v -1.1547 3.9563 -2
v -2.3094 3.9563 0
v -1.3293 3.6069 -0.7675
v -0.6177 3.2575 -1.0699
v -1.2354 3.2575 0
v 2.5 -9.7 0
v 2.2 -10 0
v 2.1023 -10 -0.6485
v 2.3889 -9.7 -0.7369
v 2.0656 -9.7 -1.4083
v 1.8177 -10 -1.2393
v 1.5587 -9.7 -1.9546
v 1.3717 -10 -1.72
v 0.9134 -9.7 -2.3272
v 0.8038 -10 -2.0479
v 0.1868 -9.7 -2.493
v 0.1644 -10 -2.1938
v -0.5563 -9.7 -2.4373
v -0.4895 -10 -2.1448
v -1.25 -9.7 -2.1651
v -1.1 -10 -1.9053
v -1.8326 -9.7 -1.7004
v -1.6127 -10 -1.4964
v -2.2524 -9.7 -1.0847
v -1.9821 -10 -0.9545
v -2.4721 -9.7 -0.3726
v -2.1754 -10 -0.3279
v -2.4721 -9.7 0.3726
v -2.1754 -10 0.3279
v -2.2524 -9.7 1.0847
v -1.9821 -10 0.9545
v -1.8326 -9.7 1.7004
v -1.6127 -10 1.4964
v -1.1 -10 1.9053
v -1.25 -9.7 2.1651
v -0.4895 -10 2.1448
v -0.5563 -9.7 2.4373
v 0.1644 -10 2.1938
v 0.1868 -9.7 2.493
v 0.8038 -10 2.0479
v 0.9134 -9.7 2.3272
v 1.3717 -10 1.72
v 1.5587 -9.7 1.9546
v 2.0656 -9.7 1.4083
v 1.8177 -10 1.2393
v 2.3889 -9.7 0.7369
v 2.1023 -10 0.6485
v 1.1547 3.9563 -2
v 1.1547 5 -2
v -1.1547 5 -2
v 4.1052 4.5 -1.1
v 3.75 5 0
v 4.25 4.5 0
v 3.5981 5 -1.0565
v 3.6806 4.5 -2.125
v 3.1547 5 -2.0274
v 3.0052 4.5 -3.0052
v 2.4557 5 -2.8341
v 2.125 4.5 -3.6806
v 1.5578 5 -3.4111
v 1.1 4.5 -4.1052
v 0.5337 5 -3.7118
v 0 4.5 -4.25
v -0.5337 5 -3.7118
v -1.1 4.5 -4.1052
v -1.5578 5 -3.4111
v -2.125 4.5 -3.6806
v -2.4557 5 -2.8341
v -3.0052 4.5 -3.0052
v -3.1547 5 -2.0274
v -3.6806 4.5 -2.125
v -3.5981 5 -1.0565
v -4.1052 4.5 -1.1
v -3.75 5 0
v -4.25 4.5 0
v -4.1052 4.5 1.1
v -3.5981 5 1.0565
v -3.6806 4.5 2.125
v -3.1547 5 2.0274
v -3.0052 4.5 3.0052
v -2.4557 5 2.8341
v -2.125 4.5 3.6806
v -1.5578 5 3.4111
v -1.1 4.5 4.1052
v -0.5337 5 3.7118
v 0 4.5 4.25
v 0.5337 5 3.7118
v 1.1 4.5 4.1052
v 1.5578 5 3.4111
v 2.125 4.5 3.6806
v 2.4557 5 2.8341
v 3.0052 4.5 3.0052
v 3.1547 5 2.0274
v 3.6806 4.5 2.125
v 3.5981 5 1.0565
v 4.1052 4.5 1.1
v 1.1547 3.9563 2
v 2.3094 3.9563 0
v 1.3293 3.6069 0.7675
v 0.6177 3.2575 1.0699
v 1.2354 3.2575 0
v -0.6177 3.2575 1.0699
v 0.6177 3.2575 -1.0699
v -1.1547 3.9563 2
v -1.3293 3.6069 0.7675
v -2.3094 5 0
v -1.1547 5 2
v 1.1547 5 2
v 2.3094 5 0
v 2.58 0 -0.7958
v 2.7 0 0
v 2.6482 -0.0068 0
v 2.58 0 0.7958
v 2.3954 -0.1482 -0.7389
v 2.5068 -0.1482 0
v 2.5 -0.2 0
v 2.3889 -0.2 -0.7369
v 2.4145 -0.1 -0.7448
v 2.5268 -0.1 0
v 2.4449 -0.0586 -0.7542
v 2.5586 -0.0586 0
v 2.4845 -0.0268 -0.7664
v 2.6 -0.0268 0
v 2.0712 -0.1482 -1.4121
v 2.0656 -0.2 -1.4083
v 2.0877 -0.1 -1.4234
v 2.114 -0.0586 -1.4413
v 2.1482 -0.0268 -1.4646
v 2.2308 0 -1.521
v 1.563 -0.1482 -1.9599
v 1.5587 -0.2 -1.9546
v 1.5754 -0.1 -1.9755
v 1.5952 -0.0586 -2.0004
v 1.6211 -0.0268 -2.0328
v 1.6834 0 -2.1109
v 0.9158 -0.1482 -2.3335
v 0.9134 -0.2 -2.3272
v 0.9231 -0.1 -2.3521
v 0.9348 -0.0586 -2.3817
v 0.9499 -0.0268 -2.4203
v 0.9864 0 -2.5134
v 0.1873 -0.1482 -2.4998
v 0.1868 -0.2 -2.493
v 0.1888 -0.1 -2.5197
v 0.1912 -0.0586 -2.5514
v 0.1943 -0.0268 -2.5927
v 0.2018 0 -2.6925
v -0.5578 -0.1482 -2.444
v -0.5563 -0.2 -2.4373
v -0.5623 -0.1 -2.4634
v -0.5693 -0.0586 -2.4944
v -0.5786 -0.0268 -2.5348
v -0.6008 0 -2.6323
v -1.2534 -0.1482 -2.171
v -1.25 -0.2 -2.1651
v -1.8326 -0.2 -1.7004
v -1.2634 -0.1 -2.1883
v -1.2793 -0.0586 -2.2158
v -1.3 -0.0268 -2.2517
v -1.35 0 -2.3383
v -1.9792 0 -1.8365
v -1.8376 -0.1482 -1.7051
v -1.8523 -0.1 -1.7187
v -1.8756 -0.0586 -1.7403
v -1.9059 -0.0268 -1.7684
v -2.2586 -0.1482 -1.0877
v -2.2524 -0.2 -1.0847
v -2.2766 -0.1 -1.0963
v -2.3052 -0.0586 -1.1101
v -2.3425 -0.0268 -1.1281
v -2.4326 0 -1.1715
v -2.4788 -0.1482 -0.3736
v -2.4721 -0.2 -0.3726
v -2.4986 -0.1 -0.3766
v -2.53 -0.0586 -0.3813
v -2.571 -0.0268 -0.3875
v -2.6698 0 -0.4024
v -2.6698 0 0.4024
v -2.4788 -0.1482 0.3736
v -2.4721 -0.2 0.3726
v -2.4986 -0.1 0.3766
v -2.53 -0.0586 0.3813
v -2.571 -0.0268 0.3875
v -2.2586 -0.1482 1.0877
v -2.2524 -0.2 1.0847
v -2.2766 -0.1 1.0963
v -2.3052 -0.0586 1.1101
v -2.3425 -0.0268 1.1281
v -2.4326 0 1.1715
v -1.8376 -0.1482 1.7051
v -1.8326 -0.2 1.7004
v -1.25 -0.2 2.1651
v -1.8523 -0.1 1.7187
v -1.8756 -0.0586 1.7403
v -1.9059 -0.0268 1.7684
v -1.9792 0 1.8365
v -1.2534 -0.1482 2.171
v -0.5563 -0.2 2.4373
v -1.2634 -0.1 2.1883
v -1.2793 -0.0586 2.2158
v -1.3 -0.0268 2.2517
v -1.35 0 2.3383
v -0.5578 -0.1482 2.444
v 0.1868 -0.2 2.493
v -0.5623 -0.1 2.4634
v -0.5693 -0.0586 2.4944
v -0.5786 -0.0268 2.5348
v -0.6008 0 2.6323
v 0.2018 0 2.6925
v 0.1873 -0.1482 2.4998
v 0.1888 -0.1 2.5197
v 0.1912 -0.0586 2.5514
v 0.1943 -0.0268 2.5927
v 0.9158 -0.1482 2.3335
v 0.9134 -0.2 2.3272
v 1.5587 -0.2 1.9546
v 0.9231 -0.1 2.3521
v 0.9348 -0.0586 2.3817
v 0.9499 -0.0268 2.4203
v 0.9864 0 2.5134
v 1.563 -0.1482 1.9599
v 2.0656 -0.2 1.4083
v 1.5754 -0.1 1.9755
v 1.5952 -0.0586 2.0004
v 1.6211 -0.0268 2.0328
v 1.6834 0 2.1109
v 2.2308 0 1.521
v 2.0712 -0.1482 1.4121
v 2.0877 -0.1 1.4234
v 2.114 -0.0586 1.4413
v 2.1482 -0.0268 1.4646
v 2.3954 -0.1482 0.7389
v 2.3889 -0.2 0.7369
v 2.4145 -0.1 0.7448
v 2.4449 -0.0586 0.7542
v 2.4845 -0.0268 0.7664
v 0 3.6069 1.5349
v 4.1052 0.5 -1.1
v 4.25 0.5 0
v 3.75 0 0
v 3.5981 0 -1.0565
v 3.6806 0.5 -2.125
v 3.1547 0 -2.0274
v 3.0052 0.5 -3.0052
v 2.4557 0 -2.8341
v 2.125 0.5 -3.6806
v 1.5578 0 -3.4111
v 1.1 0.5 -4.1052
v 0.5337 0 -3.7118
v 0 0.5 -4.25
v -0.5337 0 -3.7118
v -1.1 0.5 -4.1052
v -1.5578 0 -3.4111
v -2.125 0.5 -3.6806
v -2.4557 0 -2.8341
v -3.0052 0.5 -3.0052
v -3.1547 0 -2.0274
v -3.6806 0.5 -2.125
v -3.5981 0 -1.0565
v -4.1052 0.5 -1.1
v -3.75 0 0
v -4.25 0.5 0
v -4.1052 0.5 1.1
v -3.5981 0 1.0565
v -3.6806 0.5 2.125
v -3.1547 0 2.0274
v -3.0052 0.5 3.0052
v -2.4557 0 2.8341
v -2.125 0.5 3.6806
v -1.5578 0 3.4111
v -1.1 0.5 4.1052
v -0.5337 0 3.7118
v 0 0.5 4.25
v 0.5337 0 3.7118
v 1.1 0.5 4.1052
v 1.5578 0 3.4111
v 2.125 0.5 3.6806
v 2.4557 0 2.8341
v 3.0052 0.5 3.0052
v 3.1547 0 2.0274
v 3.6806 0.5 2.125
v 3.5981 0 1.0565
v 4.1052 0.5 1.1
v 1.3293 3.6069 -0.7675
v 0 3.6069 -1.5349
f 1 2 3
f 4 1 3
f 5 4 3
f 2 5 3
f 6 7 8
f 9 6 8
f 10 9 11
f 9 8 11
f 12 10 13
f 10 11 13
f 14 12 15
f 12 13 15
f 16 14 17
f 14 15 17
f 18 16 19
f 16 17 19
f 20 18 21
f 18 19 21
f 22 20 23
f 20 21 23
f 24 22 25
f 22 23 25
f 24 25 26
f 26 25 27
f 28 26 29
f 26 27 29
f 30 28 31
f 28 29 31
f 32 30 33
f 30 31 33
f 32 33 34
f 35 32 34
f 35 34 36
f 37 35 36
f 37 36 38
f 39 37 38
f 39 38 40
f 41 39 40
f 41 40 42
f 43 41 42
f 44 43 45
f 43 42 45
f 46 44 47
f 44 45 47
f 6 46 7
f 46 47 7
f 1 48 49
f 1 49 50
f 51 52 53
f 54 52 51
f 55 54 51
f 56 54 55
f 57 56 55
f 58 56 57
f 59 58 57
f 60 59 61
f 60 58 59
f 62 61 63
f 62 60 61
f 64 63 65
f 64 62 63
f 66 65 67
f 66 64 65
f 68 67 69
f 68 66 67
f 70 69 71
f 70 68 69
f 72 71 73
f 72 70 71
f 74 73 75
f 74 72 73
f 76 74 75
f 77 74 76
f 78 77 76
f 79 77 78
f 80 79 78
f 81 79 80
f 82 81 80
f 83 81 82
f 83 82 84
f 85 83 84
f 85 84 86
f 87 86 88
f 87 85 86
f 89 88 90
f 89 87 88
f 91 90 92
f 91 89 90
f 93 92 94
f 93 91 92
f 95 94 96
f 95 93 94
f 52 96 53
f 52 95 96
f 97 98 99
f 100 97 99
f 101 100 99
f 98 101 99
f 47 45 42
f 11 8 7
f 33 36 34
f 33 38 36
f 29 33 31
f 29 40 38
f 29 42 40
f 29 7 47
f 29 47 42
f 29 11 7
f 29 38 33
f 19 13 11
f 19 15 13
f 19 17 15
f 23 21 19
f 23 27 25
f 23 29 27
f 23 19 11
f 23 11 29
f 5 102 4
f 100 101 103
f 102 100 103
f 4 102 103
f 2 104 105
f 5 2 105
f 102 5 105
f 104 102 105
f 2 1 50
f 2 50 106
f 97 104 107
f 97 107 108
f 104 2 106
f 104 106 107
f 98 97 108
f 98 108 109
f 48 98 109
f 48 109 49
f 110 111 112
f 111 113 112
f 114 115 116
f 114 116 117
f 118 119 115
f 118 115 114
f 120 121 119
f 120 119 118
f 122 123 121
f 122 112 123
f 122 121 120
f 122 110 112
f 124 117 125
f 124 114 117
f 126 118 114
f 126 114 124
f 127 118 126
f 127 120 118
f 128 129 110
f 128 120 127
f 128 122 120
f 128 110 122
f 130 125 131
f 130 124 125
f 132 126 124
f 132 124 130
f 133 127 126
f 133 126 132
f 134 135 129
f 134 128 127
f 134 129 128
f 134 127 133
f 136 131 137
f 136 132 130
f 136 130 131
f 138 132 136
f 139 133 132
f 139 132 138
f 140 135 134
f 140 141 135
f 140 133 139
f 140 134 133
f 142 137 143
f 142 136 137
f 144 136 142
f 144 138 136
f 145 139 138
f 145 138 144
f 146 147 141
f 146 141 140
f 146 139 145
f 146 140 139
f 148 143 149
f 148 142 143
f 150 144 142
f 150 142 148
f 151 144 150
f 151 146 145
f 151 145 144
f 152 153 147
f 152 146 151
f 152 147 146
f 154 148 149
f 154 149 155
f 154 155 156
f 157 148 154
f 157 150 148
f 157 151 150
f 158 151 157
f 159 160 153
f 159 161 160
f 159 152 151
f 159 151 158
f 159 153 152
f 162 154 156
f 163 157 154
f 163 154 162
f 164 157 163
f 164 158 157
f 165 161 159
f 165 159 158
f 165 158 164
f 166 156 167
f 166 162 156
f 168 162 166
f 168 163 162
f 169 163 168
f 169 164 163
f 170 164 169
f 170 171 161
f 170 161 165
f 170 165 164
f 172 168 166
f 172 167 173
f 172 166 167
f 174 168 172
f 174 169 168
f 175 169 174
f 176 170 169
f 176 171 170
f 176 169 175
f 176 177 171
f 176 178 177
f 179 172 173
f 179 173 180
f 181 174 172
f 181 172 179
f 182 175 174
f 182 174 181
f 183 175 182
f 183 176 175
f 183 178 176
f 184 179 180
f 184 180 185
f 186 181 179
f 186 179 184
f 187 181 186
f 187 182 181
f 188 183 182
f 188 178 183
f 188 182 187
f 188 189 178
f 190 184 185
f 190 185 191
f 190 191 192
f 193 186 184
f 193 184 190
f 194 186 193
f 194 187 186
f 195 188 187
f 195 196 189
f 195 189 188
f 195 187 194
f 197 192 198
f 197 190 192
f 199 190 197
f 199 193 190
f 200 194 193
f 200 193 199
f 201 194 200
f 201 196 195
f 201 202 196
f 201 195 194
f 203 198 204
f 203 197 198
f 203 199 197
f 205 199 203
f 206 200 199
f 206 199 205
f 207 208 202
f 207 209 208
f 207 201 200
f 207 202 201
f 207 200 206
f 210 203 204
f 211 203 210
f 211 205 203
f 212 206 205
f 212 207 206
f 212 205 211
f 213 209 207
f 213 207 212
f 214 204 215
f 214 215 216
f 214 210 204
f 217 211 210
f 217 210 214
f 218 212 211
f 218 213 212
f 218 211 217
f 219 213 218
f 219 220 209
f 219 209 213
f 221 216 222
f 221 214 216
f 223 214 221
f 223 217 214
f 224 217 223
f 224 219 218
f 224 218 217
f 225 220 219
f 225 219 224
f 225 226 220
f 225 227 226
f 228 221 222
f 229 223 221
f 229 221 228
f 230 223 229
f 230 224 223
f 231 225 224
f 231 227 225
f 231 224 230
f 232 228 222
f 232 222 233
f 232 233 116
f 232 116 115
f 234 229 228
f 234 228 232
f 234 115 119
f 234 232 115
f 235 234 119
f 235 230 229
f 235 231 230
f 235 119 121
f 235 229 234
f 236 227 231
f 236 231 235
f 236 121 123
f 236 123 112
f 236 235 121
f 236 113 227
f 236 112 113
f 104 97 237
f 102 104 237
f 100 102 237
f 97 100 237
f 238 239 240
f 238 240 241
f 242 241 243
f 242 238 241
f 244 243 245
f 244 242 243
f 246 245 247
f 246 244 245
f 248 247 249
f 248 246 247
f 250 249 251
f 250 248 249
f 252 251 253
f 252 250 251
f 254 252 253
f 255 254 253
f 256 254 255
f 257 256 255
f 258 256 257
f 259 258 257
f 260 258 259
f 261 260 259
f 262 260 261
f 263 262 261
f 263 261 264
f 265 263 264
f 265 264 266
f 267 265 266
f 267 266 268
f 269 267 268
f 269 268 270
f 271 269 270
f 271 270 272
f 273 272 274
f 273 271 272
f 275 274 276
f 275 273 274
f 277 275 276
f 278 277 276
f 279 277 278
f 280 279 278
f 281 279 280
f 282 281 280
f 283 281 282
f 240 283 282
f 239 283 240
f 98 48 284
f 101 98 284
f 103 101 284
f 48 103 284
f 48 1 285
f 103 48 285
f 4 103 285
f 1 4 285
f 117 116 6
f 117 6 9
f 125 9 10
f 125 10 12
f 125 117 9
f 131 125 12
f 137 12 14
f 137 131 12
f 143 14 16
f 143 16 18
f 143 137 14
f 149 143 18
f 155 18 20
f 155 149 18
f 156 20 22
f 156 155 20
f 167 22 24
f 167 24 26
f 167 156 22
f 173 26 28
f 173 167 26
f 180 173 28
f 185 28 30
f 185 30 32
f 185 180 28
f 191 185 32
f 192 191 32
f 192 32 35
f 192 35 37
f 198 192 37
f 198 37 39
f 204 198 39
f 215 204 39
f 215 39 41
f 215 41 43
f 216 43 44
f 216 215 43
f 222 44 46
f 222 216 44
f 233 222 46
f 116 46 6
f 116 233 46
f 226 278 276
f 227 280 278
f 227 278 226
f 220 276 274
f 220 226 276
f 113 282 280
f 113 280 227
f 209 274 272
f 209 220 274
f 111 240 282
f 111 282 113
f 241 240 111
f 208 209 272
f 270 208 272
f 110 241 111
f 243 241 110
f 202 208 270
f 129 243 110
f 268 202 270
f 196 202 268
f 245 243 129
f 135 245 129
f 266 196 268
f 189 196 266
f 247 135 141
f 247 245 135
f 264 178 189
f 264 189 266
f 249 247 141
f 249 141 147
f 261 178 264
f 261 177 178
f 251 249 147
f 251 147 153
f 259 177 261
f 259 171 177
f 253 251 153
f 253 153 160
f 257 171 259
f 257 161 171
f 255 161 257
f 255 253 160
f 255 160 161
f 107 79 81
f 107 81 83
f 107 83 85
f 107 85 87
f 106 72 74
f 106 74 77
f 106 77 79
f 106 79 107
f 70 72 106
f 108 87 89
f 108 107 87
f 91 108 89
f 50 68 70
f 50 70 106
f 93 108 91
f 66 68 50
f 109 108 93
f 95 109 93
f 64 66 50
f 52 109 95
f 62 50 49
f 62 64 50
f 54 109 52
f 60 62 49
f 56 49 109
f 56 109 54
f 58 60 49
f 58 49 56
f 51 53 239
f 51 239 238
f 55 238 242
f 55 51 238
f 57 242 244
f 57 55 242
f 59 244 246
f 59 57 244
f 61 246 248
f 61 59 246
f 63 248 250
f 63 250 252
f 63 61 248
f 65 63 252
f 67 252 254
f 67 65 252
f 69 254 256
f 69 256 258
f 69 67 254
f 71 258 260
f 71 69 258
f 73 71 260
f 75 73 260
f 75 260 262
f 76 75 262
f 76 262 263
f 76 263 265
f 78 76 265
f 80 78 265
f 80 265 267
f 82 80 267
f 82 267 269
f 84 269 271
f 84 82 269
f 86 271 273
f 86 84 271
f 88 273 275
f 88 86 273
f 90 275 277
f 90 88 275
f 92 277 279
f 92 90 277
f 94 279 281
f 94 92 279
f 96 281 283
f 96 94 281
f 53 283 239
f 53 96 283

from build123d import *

# Parameters (mm, degrees)
REDONDEO1_R          = 0.2
CHAFL_N1_SIZE        = 0.3
CHAFL_N2_SIZE        = 0.5
CORTAR_BARRER1_START = 3.956316317
CORTAR_BARRER1_DEPTH = 1.043683683


with BuildPart() as part:
    # Croquis1 → Revolución1 (revolve)
    with BuildSketch(Plane.XY):
        Polygon((0, 0), (0, -10), (2.5, -10), (2.5, 0), (4.25, 0), (4.25, 5), (0, 5), align=None)
    revolve(axis=Axis((0, -1001.198752701, 0), (0, 1, 0)))

    # Redondeo1
    redondeo1_edges = [part.edges().sort_by_distance(p)[0] for p in [
        (-2.5, 0, 0),
    ]]
    fillet(redondeo1_edges, radius=REDONDEO1_R)

    # Chaflán1
    chafl_n1_edges = [part.edges().sort_by_distance(p)[0] for p in [
        (-2.5, -10, 0),
    ]]
    chamfer(chafl_n1_edges, length=CHAFL_N1_SIZE)

    # Chaflán2
    chafl_n2_edges = [part.edges().sort_by_distance(p)[0] for p in [
        (-4.25, 5, 0),
        (-4.25, 0, 0),
    ]]
    chamfer(chafl_n2_edges, length=CHAFL_N2_SIZE)

    # Cortar-Barrer1: read off the stored shape, not the designer's step
    # Cortar-Barrer1 outline → Cortar-Barrer1 (cut)
    with BuildSketch(Plane(origin=(0, 0, 0), x_dir=(1, 0, 0), z_dir=(0, 1, 0)).offset(CORTAR_BARRER1_START)):
        Polygon((1.154700538, 2), (-1.154700538, 2), (-2.309401077, 0), (-1.154700538, -2), (1.154700538, -2), (2.309401077, 0), align=None)
    extrude(amount=CORTAR_BARRER1_DEPTH, mode=Mode.SUBTRACT)

    # Cortar-Barrer1 2: loft between two sections, ruled curve by curve
    cortar_barrer1_2_from = [
        Edge.make_line((-2.309401077, 3.956316317, 0), (-1.154700538, 3.956316317, -2)),
        Edge.make_line((-1.154700538, 3.956316317, 2), (-2.309401077, 3.956316317, 0)),
        Edge.make_line((-1.154700538, 3.956316317, -2), (1.154700538, 3.956316317, -2)),
        Edge.make_line((1.154700538, 3.956316317, 2), (-1.154700538, 3.956316317, 2)),
        Edge.make_line((1.154700538, 3.956316317, -2), (2.309401077, 3.956316317, 0)),
        Edge.make_line((2.309401077, 3.956316317, 0), (1.154700538, 3.956316317, 2)),
    ]
    cortar_barrer1_2_to = [
        Edge.make_line((-1.235376897, 3.257522104, 0), (-0.617688448, 3.257522104, -1.069867776)),
        Edge.make_line((-0.617688448, 3.257522104, 1.069867776), (-1.235376897, 3.257522104, 0)),
        Edge.make_line((-0.617688448, 3.257522104, -1.069867776), (0.617688448, 3.257522104, -1.069867776)),
        Edge.make_line((0.617688448, 3.257522104, 1.069867776), (-0.617688448, 3.257522104, 1.069867776)),
        Edge.make_line((0.617688448, 3.257522104, -1.069867776), (1.235376897, 3.257522104, 0)),
        Edge.make_line((1.235376897, 3.257522104, 0), (0.617688448, 3.257522104, 1.069867776)),
    ]
    cortar_barrer1_2 = Solid(Shell([*[Face.make_surface_from_curves(cortar_barrer1_2_from[k], cortar_barrer1_2_to[k]) for k in range(6)], Face(Wire(cortar_barrer1_2_from)), Face(Wire(cortar_barrer1_2_to))]))
    add(cortar_barrer1_2, mode=Mode.SUBTRACT)


solid = part.part
